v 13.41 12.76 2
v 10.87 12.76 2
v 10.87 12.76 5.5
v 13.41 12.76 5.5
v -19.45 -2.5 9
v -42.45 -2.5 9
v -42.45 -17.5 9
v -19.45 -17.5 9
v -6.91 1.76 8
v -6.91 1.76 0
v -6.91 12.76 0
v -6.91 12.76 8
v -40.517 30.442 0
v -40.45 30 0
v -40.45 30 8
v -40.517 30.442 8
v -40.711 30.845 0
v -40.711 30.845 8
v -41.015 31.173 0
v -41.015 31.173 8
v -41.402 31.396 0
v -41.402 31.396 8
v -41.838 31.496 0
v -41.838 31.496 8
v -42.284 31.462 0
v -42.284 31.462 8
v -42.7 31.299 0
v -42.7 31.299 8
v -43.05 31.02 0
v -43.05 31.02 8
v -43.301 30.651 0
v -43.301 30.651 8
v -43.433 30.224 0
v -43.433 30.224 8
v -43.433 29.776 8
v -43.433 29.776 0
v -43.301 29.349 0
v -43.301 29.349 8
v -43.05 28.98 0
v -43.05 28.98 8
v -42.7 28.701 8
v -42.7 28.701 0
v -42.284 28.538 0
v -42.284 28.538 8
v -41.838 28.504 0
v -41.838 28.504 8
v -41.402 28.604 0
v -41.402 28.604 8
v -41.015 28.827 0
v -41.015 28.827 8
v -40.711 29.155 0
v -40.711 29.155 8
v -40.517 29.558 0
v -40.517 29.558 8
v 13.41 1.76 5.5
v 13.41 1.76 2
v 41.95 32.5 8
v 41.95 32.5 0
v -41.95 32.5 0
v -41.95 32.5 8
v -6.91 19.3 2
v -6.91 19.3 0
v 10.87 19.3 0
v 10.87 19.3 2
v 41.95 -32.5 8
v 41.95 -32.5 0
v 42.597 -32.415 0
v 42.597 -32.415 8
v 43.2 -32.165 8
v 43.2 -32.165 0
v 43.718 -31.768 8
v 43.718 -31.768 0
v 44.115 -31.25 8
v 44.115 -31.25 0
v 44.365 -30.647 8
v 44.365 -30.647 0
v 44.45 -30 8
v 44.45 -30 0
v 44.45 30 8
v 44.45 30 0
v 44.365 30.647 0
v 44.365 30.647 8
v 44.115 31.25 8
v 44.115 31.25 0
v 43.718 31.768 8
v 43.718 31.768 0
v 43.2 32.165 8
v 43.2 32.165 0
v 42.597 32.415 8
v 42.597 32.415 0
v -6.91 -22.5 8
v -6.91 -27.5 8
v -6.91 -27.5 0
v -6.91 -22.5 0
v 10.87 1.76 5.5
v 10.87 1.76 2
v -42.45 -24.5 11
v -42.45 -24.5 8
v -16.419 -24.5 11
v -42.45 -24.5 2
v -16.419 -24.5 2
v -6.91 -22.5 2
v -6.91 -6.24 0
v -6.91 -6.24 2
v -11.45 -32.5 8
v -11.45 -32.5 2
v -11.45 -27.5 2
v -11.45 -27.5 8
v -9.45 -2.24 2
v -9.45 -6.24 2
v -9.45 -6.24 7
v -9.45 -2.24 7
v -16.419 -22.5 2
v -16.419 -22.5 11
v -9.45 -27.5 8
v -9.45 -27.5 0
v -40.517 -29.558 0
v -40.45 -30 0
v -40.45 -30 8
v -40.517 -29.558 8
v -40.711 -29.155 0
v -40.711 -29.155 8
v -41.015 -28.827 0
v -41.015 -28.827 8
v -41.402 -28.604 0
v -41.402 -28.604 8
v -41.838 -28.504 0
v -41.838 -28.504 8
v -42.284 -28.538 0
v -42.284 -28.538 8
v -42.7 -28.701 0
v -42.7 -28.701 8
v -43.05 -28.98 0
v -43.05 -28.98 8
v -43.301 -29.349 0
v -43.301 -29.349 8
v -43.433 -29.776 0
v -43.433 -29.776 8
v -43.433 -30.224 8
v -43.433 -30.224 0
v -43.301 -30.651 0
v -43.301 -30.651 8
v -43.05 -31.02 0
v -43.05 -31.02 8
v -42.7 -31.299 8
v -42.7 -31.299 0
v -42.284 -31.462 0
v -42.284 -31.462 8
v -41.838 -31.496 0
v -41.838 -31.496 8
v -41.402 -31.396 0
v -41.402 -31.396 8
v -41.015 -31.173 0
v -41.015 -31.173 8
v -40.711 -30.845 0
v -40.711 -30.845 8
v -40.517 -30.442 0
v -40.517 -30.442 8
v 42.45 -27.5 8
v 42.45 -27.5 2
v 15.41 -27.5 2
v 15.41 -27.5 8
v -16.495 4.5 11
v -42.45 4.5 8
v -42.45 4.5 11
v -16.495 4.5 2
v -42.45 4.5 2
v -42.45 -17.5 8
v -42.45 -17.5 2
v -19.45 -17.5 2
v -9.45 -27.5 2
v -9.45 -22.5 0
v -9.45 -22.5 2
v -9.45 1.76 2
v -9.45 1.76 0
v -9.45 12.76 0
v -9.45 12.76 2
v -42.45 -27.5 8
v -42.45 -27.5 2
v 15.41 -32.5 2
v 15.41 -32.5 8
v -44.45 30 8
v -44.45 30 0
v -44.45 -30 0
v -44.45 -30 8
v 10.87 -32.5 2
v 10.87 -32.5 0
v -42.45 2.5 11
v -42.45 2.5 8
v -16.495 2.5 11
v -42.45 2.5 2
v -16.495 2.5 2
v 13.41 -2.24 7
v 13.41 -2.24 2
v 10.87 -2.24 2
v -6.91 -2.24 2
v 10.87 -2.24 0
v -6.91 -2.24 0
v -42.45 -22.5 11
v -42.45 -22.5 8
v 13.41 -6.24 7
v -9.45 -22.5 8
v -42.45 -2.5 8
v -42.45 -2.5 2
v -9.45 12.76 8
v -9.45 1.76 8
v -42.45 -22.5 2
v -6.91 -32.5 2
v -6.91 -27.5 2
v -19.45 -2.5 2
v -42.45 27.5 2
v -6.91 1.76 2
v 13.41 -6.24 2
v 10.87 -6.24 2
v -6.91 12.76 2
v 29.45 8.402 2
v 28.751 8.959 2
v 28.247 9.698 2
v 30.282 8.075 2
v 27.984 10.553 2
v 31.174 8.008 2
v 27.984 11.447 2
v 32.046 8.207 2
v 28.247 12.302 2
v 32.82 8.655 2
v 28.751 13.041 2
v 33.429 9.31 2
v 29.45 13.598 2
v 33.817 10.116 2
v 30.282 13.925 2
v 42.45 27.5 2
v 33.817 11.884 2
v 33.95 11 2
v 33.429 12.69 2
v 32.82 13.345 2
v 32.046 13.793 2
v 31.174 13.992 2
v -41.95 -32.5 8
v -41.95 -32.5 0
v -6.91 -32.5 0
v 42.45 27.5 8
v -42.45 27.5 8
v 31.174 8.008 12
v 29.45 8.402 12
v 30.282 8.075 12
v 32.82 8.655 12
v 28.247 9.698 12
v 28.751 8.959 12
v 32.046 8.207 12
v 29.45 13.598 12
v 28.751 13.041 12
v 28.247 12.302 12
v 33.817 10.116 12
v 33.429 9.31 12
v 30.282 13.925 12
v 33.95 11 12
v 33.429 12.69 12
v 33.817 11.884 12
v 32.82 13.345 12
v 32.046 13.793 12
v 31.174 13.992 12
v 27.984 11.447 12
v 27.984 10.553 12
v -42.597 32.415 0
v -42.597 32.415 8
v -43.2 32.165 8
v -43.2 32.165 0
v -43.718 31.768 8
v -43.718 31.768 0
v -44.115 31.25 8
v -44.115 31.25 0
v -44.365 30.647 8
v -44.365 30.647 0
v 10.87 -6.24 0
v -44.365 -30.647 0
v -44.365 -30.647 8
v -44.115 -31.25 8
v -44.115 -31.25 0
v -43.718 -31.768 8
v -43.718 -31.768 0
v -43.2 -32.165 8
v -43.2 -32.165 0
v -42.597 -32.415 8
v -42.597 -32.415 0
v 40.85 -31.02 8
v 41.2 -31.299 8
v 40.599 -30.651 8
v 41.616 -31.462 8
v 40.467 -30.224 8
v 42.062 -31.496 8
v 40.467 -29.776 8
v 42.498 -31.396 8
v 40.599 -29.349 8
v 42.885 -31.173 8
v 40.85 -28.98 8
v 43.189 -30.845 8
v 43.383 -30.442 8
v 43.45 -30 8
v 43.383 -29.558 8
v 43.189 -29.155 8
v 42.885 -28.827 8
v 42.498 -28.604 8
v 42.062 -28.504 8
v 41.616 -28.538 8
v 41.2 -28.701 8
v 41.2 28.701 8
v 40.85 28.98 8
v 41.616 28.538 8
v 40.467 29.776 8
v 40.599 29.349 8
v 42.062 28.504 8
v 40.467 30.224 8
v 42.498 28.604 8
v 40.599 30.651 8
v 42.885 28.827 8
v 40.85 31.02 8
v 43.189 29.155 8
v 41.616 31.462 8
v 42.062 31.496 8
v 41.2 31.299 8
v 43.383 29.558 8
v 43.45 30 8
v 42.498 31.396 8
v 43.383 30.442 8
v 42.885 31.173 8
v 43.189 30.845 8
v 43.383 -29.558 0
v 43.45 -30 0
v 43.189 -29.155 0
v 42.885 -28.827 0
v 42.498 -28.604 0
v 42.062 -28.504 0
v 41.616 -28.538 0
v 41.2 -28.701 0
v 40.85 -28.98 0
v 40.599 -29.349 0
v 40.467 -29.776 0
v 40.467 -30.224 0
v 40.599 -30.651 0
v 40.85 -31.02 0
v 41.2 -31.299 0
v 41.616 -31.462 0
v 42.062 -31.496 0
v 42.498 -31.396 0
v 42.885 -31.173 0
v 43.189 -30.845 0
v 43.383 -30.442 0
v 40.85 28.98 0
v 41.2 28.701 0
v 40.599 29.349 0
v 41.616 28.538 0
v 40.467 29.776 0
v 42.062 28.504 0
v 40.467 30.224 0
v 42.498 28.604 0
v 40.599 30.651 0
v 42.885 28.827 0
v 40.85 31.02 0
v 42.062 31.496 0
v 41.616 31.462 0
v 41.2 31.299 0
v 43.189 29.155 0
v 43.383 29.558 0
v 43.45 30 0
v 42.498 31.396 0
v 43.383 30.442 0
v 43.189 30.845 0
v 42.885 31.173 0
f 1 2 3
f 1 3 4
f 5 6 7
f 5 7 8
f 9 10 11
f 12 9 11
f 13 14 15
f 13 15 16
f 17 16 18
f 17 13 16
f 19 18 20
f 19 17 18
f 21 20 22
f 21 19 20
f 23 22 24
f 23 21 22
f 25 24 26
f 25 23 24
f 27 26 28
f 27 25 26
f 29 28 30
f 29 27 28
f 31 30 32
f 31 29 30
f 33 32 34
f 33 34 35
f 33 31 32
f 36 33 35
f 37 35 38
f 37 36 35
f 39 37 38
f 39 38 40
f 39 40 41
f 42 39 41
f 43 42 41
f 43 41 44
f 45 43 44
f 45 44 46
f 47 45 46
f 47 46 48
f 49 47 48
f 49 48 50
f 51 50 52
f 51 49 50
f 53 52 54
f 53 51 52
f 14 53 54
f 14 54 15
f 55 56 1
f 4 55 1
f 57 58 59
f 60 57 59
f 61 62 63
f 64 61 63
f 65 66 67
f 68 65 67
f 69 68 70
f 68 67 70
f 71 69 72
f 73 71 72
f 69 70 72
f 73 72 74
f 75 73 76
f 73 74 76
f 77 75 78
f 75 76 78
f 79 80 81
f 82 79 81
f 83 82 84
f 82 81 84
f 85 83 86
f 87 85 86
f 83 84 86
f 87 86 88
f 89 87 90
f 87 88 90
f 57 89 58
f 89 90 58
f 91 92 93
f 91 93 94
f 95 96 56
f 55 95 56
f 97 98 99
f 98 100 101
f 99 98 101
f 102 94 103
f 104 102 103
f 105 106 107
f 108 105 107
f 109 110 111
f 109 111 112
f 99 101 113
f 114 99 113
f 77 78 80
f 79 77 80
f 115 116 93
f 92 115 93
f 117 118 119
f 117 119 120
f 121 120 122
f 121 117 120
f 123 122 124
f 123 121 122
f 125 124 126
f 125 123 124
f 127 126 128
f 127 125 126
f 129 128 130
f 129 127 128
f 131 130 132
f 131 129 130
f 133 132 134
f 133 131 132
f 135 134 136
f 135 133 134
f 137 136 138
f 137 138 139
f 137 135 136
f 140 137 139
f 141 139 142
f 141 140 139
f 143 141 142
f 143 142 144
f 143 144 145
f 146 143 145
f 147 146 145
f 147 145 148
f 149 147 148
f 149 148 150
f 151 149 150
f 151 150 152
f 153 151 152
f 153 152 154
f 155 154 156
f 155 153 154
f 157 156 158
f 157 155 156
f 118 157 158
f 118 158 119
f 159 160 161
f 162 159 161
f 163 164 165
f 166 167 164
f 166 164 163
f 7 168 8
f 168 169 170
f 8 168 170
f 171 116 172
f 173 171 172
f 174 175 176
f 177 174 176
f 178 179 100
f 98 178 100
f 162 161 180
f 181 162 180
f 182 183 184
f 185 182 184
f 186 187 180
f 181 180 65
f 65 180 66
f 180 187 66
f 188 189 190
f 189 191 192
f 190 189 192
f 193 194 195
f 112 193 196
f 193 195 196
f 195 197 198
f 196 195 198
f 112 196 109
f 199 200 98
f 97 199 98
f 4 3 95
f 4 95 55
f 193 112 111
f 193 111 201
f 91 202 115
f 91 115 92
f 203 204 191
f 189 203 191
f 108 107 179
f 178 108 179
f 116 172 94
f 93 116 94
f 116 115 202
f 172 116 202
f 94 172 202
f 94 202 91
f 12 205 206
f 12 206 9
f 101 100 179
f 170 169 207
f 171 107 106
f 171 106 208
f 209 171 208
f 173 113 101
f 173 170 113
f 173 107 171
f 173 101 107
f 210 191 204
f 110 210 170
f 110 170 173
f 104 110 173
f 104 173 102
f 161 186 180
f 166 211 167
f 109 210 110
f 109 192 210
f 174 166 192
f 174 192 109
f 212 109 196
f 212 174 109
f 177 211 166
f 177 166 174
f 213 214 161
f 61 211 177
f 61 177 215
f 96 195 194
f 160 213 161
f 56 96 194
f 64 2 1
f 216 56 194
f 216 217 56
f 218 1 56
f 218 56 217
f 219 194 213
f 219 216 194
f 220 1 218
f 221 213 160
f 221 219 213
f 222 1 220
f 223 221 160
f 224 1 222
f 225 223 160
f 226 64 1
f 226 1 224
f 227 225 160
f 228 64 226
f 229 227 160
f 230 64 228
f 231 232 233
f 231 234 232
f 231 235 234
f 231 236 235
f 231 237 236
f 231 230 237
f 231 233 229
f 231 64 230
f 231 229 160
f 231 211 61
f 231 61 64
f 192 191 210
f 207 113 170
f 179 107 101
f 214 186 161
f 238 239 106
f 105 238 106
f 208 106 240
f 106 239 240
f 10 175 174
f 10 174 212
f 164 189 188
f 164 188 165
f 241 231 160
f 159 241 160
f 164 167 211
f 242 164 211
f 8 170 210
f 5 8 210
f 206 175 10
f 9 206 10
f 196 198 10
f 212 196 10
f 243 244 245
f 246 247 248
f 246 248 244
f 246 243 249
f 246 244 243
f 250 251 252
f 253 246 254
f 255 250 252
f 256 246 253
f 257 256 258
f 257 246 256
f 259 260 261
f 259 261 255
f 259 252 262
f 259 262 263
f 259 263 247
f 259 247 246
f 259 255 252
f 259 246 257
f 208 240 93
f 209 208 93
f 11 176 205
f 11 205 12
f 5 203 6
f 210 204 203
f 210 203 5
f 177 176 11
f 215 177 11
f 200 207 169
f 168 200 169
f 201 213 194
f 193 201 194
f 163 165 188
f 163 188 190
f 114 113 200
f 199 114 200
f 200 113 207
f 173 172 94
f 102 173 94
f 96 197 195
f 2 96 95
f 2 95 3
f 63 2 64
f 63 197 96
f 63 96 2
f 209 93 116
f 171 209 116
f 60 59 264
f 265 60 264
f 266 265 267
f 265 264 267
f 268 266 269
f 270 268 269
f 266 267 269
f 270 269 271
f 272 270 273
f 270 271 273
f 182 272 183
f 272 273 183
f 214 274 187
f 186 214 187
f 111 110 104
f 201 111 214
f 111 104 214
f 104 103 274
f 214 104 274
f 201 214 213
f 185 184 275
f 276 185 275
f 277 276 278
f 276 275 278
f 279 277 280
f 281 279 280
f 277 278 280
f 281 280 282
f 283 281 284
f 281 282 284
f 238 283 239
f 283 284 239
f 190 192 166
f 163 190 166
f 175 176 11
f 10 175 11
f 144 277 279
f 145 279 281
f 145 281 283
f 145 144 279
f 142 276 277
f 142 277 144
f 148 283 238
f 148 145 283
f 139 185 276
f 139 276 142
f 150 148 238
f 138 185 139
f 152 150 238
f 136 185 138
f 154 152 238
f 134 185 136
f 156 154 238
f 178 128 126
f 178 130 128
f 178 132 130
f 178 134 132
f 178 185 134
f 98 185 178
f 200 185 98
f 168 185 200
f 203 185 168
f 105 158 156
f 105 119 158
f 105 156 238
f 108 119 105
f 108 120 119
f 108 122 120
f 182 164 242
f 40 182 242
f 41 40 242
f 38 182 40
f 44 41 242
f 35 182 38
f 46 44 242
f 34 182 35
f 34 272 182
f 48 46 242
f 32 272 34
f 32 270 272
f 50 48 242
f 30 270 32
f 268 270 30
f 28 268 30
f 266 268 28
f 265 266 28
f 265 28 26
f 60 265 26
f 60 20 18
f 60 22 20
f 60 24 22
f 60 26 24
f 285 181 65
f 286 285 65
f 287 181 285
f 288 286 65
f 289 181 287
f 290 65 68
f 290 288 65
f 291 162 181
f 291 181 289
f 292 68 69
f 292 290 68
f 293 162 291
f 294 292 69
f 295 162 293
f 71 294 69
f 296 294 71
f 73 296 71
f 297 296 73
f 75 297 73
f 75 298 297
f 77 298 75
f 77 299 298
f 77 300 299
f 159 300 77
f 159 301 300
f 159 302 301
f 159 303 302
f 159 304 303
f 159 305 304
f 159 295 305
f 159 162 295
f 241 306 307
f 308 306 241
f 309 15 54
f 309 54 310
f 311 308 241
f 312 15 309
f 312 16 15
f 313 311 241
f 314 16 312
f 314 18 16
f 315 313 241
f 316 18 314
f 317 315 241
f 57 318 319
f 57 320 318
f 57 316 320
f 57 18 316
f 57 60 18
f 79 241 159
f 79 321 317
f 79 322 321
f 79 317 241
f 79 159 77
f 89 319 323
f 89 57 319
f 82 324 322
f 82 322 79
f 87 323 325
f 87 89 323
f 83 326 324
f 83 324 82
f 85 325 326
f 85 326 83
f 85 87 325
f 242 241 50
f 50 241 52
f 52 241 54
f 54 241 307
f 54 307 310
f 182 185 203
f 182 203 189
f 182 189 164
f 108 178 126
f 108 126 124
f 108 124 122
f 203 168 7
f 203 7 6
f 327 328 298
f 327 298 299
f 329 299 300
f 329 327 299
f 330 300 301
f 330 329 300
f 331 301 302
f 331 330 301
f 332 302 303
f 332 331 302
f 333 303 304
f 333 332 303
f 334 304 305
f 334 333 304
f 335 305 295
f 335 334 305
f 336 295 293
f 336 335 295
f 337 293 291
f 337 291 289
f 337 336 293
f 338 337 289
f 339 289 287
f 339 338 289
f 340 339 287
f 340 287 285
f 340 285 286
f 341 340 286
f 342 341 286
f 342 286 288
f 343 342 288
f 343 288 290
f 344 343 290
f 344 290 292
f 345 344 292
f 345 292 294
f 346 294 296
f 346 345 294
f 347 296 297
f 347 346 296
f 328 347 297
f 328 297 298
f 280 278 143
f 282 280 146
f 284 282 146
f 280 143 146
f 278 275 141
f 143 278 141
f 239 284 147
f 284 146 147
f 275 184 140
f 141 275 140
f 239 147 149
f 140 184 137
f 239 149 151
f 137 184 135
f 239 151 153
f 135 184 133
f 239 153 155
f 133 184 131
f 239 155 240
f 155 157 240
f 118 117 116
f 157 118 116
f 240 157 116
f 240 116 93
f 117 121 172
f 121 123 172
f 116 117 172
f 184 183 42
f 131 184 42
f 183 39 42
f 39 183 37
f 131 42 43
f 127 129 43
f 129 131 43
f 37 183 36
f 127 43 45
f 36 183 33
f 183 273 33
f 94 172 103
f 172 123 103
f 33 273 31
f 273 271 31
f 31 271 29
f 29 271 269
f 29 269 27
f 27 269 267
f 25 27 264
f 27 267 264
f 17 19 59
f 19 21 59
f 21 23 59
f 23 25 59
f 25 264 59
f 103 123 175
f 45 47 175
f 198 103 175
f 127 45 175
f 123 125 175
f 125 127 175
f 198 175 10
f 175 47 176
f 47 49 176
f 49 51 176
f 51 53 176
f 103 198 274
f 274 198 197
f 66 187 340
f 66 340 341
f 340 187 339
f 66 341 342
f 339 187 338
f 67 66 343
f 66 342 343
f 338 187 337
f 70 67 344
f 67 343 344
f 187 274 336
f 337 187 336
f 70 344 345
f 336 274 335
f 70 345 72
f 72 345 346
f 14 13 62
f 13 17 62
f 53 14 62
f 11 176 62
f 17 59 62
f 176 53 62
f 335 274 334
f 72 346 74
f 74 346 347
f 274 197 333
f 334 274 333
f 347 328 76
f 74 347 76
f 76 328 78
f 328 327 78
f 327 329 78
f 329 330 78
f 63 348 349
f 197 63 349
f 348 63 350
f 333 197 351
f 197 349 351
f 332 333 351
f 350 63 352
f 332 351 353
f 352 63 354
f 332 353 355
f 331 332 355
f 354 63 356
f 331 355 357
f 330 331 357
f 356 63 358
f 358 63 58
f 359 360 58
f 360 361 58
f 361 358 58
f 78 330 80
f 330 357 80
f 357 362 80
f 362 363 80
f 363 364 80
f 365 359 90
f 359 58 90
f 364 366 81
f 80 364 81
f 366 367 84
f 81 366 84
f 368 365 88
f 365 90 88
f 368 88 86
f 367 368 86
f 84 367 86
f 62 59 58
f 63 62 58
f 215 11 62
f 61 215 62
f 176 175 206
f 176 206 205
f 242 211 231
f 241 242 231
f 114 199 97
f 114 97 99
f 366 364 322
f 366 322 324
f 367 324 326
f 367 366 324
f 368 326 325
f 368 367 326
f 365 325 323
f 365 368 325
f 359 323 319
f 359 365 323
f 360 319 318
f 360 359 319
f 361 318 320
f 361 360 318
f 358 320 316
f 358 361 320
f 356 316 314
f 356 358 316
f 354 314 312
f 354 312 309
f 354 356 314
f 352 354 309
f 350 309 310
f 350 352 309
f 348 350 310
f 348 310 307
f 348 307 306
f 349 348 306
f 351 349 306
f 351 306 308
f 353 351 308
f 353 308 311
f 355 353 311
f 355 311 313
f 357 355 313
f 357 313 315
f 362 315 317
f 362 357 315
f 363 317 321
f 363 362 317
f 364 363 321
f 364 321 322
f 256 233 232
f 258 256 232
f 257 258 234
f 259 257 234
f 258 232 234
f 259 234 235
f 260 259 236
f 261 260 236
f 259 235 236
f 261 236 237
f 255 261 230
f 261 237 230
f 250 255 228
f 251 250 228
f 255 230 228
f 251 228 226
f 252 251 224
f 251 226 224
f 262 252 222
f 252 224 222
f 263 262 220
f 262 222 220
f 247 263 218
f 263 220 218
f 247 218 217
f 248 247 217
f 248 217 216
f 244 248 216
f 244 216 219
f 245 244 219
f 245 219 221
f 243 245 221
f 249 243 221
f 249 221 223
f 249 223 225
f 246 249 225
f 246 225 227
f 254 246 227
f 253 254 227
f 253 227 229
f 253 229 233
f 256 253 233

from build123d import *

# Parameters (mm, degrees)
F0_R     = 1.5
F1_DEPTH = 8
F0_W     = 2.54
F0_H     = 11
F0_H_2   = 5
F0_R_2   = 3
F0_H_3   = 16.26
F0_H_4   = 4
F2_DEPTH = 2
F0_W_2   = 23
F0_H_5   = 15
F3_DEPTH = 9
F0_W_3   = 25.9549565881
F0_H_6   = 2
F4_DEPTH = 11
F0_W_4   = 17.78
F5_DEPTH = 7
F6_DEPTH = 5.5
F7_DEPTH = 12


# Not quite as in the source:
# - a feature names something its author has since deleted; it is built from what else it names


with BuildPart() as f1:
    # F0 (on Top) → F1 (new body)
    with BuildSketch(Plane.XY):
        with BuildLine():
            Line((-42.45, 27.5), (42.45, 27.5))
            Line((42.45, 27.5), (42.45, 0.5))
            Line((42.45, 0.5), (42.45, -20.5))
            Line((42.45, -20.5), (42.45, -27.5))
            Line((42.45, -27.5), (15.41, -27.5))
            Line((15.41, -27.5), (15.41, -32.5))
            Line((15.41, -32.5), (41.95, -32.5))
            ThreePointArc((41.95, -32.5), (43.717766953, -31.767766953), (44.45, -30))
            Line((44.45, -30), (44.45, -27.5))
            Line((44.45, -27.5), (44.45, 27.5))
            Line((44.45, 27.5), (44.45, 30))
            ThreePointArc((44.45, 30), (43.717766953, 31.767766953), (41.95, 32.5))
            Line((41.95, 32.5), (-41.95, 32.5))
            ThreePointArc((-41.95, 32.5), (-43.717766953, 31.767766953), (-44.45, 30))
            Line((-44.45, 30), (-44.45, 27.5))
            Line((-44.45, 27.5), (-44.45, -27.5))
            Line((-44.45, -27.5), (-44.45, -30))
            ThreePointArc((-44.45, -30), (-43.717766953, -31.767766953), (-41.95, -32.5))
            Line((-41.95, -32.5), (-11.45, -32.5))
            Line((-11.45, -32.5), (-11.45, -27.5))
            Line((-11.45, -27.5), (-42.45, -27.5))
            Line((-42.45, -27.5), (-42.45, -24.5))
            Line((-42.45, -24.5), (-42.45, -22.5))
            Line((-42.45, -22.5), (-42.45, -20.5))
            Line((-42.45, -20.5), (-42.45, -17.5))
            Line((-42.45, -17.5), (-42.45, -2.5))
            Line((-42.45, -2.5), (-42.45, 0.5))
            Line((-42.45, 0.5), (-42.45, 2.5))
            Line((-42.45, 2.5), (-42.45, 4.5))
            Line((-42.45, 4.5), (-42.45, 27.5))
        make_face()
        with Locations((-41.95, -30)):
            Circle(F0_R, mode=Mode.SUBTRACT)
        with Locations((41.95, -30)):
            Circle(F0_R, mode=Mode.SUBTRACT)
        with Locations((-41.95, 30)):
            Circle(F0_R, mode=Mode.SUBTRACT)
        with Locations((41.95, 30)):
            Circle(F0_R, mode=Mode.SUBTRACT)
    extrude(amount=F1_DEPTH)

    # F0 (on Top) → F2 (join)
    with BuildSketch(Plane.XY):
        Polygon((42.45, 0.5), (42.45, 27.5), (-42.45, 27.5), (-42.45, 4.5), (-16.4950434119, 4.5), (-16.4950434119, 2.5), (-42.45, 2.5), (-42.45, 0.5), (-16.45, 0.5), (-16.45, -20.5), (-42.45, -20.5), (-42.45, -22.5), (-16.4950434119, -22.5), (-16.419, -22.5), (-16.419, -24.5), (-42.45, -24.5), (-42.45, -27.5), (-11.45, -27.5), (-11.45, -32.5), (-9.45, -32.5), (-9.45, -27.5), (-9.45, -22.5), (-9.45, -6.24), (-9.45, -2.24), (-9.45, 1.76), (-9.45, 12.76), (-9.45, 18.3), (-6.91, 18.3), (-6.91, 19.3), (10.87, 19.3), (10.87, 18.3), (13.41, 18.3), (13.41, 12.76), (13.41, 1.76), (13.41, -2.24), (13.41, -6.24), (13.41, -32.5), (15.41, -32.5), (15.41, -27.5), (42.45, -27.5), (42.45, -20.5), align=None)
        with Locations((30.95, 11)):
            Circle(F0_R_2, mode=Mode.SUBTRACT)
        Polygon((-16.45, 0.5), (-42.45, 0.5), (-42.45, -2.5), (-19.45, -2.5), (-19.45, -17.5), (-42.45, -17.5), (-42.45, -20.5), (-16.45, -20.5), align=None)
        with Locations((-8.18, -14.37)):
            Rectangle(F0_W, F0_H_3)
        with Locations((-8.18, -4.24)):
            Rectangle(F0_W, F0_H_4)
        with Locations((-8.18, -0.24)):
            Rectangle(F0_W, F0_H_4)
        Polygon((-9.45, 12.76), (-6.91, 12.76), (-6.91, 15.76), (-6.91, 18.3), (-9.45, 18.3), align=None)
        Polygon((-9.45, -32.5), (-6.91, -32.5), (-6.91, -29.96), (-6.91, -27.5), (-9.45, -27.5), align=None)
        Polygon((10.87, -32.5), (13.41, -32.5), (13.41, -6.24), (10.87, -6.24), (10.87, -29.96), align=None)
        with Locations((12.14, -4.24)):
            Rectangle(F0_W, F0_H_4)
        Polygon((10.87, 12.76), (13.41, 12.76), (13.41, 18.3), (10.87, 18.3), (10.87, 15.76), align=None)
        with Locations((12.14, -0.24)):
            Rectangle(F0_W, F0_H_4)
    extrude(amount=F2_DEPTH)

    # F0 (on Top) → F3 (join)
    with BuildSketch(Plane.XY):
        with Locations((-30.95, -10)):
            Rectangle(F0_W_2, F0_H_5)
    extrude(amount=F3_DEPTH)

    # F0 (on Top) → F4 (join)
    with BuildSketch(Plane.XY):
        with Locations((-29.4725217059, 3.5)):
            Rectangle(F0_W_3, F0_H_6)
        Polygon((-16.4950434119, -22.5), (-42.45, -22.5), (-42.45, -24.5), (-16.419, -24.5), (-16.419, -22.5), align=None)
    extrude(amount=F4_DEPTH)

    # F0 (on Top) → F5 (join)
    with BuildSketch(Plane.XY):
        with Locations((1.98, -4.24)):
            Rectangle(F0_W_4, F0_H_4)
        with Locations((12.14, -4.24)):
            Rectangle(F0_W, F0_H_4)
        with Locations((-8.18, -4.24)):
            Rectangle(F0_W, F0_H_4)
    extrude(amount=F5_DEPTH)

    # F0 (on Top) → F6 (join)
    with BuildSketch(Plane.XY):
        with Locations((12.14, 7.26)):
            Rectangle(F0_W, F0_H)
    extrude(amount=F6_DEPTH)

    # F0 (on Top) → F7 (join)
    with BuildSketch(Plane.XY):
        with Locations((30.95, 11)):
            Circle(F0_R_2)
    extrude(amount=F7_DEPTH)


with BuildPart() as f1b:
    # F0 (on Top) → F1, piece 2 (new body)
    with BuildSketch(Plane.XY):
        with Locations((-8.18, 7.26)):
            Rectangle(F0_W, F0_H)
    extrude(amount=F1_DEPTH)


with BuildPart() as f1c:
    # F0 (on Top) → F1, piece 3 (new body)
    with BuildSketch(Plane.XY):
        with Locations((-8.18, -25)):
            Rectangle(F0_W, F0_H_2)
    extrude(amount=F1_DEPTH)


solid = Compound([f1.part, f1b.part, f1c.part])
